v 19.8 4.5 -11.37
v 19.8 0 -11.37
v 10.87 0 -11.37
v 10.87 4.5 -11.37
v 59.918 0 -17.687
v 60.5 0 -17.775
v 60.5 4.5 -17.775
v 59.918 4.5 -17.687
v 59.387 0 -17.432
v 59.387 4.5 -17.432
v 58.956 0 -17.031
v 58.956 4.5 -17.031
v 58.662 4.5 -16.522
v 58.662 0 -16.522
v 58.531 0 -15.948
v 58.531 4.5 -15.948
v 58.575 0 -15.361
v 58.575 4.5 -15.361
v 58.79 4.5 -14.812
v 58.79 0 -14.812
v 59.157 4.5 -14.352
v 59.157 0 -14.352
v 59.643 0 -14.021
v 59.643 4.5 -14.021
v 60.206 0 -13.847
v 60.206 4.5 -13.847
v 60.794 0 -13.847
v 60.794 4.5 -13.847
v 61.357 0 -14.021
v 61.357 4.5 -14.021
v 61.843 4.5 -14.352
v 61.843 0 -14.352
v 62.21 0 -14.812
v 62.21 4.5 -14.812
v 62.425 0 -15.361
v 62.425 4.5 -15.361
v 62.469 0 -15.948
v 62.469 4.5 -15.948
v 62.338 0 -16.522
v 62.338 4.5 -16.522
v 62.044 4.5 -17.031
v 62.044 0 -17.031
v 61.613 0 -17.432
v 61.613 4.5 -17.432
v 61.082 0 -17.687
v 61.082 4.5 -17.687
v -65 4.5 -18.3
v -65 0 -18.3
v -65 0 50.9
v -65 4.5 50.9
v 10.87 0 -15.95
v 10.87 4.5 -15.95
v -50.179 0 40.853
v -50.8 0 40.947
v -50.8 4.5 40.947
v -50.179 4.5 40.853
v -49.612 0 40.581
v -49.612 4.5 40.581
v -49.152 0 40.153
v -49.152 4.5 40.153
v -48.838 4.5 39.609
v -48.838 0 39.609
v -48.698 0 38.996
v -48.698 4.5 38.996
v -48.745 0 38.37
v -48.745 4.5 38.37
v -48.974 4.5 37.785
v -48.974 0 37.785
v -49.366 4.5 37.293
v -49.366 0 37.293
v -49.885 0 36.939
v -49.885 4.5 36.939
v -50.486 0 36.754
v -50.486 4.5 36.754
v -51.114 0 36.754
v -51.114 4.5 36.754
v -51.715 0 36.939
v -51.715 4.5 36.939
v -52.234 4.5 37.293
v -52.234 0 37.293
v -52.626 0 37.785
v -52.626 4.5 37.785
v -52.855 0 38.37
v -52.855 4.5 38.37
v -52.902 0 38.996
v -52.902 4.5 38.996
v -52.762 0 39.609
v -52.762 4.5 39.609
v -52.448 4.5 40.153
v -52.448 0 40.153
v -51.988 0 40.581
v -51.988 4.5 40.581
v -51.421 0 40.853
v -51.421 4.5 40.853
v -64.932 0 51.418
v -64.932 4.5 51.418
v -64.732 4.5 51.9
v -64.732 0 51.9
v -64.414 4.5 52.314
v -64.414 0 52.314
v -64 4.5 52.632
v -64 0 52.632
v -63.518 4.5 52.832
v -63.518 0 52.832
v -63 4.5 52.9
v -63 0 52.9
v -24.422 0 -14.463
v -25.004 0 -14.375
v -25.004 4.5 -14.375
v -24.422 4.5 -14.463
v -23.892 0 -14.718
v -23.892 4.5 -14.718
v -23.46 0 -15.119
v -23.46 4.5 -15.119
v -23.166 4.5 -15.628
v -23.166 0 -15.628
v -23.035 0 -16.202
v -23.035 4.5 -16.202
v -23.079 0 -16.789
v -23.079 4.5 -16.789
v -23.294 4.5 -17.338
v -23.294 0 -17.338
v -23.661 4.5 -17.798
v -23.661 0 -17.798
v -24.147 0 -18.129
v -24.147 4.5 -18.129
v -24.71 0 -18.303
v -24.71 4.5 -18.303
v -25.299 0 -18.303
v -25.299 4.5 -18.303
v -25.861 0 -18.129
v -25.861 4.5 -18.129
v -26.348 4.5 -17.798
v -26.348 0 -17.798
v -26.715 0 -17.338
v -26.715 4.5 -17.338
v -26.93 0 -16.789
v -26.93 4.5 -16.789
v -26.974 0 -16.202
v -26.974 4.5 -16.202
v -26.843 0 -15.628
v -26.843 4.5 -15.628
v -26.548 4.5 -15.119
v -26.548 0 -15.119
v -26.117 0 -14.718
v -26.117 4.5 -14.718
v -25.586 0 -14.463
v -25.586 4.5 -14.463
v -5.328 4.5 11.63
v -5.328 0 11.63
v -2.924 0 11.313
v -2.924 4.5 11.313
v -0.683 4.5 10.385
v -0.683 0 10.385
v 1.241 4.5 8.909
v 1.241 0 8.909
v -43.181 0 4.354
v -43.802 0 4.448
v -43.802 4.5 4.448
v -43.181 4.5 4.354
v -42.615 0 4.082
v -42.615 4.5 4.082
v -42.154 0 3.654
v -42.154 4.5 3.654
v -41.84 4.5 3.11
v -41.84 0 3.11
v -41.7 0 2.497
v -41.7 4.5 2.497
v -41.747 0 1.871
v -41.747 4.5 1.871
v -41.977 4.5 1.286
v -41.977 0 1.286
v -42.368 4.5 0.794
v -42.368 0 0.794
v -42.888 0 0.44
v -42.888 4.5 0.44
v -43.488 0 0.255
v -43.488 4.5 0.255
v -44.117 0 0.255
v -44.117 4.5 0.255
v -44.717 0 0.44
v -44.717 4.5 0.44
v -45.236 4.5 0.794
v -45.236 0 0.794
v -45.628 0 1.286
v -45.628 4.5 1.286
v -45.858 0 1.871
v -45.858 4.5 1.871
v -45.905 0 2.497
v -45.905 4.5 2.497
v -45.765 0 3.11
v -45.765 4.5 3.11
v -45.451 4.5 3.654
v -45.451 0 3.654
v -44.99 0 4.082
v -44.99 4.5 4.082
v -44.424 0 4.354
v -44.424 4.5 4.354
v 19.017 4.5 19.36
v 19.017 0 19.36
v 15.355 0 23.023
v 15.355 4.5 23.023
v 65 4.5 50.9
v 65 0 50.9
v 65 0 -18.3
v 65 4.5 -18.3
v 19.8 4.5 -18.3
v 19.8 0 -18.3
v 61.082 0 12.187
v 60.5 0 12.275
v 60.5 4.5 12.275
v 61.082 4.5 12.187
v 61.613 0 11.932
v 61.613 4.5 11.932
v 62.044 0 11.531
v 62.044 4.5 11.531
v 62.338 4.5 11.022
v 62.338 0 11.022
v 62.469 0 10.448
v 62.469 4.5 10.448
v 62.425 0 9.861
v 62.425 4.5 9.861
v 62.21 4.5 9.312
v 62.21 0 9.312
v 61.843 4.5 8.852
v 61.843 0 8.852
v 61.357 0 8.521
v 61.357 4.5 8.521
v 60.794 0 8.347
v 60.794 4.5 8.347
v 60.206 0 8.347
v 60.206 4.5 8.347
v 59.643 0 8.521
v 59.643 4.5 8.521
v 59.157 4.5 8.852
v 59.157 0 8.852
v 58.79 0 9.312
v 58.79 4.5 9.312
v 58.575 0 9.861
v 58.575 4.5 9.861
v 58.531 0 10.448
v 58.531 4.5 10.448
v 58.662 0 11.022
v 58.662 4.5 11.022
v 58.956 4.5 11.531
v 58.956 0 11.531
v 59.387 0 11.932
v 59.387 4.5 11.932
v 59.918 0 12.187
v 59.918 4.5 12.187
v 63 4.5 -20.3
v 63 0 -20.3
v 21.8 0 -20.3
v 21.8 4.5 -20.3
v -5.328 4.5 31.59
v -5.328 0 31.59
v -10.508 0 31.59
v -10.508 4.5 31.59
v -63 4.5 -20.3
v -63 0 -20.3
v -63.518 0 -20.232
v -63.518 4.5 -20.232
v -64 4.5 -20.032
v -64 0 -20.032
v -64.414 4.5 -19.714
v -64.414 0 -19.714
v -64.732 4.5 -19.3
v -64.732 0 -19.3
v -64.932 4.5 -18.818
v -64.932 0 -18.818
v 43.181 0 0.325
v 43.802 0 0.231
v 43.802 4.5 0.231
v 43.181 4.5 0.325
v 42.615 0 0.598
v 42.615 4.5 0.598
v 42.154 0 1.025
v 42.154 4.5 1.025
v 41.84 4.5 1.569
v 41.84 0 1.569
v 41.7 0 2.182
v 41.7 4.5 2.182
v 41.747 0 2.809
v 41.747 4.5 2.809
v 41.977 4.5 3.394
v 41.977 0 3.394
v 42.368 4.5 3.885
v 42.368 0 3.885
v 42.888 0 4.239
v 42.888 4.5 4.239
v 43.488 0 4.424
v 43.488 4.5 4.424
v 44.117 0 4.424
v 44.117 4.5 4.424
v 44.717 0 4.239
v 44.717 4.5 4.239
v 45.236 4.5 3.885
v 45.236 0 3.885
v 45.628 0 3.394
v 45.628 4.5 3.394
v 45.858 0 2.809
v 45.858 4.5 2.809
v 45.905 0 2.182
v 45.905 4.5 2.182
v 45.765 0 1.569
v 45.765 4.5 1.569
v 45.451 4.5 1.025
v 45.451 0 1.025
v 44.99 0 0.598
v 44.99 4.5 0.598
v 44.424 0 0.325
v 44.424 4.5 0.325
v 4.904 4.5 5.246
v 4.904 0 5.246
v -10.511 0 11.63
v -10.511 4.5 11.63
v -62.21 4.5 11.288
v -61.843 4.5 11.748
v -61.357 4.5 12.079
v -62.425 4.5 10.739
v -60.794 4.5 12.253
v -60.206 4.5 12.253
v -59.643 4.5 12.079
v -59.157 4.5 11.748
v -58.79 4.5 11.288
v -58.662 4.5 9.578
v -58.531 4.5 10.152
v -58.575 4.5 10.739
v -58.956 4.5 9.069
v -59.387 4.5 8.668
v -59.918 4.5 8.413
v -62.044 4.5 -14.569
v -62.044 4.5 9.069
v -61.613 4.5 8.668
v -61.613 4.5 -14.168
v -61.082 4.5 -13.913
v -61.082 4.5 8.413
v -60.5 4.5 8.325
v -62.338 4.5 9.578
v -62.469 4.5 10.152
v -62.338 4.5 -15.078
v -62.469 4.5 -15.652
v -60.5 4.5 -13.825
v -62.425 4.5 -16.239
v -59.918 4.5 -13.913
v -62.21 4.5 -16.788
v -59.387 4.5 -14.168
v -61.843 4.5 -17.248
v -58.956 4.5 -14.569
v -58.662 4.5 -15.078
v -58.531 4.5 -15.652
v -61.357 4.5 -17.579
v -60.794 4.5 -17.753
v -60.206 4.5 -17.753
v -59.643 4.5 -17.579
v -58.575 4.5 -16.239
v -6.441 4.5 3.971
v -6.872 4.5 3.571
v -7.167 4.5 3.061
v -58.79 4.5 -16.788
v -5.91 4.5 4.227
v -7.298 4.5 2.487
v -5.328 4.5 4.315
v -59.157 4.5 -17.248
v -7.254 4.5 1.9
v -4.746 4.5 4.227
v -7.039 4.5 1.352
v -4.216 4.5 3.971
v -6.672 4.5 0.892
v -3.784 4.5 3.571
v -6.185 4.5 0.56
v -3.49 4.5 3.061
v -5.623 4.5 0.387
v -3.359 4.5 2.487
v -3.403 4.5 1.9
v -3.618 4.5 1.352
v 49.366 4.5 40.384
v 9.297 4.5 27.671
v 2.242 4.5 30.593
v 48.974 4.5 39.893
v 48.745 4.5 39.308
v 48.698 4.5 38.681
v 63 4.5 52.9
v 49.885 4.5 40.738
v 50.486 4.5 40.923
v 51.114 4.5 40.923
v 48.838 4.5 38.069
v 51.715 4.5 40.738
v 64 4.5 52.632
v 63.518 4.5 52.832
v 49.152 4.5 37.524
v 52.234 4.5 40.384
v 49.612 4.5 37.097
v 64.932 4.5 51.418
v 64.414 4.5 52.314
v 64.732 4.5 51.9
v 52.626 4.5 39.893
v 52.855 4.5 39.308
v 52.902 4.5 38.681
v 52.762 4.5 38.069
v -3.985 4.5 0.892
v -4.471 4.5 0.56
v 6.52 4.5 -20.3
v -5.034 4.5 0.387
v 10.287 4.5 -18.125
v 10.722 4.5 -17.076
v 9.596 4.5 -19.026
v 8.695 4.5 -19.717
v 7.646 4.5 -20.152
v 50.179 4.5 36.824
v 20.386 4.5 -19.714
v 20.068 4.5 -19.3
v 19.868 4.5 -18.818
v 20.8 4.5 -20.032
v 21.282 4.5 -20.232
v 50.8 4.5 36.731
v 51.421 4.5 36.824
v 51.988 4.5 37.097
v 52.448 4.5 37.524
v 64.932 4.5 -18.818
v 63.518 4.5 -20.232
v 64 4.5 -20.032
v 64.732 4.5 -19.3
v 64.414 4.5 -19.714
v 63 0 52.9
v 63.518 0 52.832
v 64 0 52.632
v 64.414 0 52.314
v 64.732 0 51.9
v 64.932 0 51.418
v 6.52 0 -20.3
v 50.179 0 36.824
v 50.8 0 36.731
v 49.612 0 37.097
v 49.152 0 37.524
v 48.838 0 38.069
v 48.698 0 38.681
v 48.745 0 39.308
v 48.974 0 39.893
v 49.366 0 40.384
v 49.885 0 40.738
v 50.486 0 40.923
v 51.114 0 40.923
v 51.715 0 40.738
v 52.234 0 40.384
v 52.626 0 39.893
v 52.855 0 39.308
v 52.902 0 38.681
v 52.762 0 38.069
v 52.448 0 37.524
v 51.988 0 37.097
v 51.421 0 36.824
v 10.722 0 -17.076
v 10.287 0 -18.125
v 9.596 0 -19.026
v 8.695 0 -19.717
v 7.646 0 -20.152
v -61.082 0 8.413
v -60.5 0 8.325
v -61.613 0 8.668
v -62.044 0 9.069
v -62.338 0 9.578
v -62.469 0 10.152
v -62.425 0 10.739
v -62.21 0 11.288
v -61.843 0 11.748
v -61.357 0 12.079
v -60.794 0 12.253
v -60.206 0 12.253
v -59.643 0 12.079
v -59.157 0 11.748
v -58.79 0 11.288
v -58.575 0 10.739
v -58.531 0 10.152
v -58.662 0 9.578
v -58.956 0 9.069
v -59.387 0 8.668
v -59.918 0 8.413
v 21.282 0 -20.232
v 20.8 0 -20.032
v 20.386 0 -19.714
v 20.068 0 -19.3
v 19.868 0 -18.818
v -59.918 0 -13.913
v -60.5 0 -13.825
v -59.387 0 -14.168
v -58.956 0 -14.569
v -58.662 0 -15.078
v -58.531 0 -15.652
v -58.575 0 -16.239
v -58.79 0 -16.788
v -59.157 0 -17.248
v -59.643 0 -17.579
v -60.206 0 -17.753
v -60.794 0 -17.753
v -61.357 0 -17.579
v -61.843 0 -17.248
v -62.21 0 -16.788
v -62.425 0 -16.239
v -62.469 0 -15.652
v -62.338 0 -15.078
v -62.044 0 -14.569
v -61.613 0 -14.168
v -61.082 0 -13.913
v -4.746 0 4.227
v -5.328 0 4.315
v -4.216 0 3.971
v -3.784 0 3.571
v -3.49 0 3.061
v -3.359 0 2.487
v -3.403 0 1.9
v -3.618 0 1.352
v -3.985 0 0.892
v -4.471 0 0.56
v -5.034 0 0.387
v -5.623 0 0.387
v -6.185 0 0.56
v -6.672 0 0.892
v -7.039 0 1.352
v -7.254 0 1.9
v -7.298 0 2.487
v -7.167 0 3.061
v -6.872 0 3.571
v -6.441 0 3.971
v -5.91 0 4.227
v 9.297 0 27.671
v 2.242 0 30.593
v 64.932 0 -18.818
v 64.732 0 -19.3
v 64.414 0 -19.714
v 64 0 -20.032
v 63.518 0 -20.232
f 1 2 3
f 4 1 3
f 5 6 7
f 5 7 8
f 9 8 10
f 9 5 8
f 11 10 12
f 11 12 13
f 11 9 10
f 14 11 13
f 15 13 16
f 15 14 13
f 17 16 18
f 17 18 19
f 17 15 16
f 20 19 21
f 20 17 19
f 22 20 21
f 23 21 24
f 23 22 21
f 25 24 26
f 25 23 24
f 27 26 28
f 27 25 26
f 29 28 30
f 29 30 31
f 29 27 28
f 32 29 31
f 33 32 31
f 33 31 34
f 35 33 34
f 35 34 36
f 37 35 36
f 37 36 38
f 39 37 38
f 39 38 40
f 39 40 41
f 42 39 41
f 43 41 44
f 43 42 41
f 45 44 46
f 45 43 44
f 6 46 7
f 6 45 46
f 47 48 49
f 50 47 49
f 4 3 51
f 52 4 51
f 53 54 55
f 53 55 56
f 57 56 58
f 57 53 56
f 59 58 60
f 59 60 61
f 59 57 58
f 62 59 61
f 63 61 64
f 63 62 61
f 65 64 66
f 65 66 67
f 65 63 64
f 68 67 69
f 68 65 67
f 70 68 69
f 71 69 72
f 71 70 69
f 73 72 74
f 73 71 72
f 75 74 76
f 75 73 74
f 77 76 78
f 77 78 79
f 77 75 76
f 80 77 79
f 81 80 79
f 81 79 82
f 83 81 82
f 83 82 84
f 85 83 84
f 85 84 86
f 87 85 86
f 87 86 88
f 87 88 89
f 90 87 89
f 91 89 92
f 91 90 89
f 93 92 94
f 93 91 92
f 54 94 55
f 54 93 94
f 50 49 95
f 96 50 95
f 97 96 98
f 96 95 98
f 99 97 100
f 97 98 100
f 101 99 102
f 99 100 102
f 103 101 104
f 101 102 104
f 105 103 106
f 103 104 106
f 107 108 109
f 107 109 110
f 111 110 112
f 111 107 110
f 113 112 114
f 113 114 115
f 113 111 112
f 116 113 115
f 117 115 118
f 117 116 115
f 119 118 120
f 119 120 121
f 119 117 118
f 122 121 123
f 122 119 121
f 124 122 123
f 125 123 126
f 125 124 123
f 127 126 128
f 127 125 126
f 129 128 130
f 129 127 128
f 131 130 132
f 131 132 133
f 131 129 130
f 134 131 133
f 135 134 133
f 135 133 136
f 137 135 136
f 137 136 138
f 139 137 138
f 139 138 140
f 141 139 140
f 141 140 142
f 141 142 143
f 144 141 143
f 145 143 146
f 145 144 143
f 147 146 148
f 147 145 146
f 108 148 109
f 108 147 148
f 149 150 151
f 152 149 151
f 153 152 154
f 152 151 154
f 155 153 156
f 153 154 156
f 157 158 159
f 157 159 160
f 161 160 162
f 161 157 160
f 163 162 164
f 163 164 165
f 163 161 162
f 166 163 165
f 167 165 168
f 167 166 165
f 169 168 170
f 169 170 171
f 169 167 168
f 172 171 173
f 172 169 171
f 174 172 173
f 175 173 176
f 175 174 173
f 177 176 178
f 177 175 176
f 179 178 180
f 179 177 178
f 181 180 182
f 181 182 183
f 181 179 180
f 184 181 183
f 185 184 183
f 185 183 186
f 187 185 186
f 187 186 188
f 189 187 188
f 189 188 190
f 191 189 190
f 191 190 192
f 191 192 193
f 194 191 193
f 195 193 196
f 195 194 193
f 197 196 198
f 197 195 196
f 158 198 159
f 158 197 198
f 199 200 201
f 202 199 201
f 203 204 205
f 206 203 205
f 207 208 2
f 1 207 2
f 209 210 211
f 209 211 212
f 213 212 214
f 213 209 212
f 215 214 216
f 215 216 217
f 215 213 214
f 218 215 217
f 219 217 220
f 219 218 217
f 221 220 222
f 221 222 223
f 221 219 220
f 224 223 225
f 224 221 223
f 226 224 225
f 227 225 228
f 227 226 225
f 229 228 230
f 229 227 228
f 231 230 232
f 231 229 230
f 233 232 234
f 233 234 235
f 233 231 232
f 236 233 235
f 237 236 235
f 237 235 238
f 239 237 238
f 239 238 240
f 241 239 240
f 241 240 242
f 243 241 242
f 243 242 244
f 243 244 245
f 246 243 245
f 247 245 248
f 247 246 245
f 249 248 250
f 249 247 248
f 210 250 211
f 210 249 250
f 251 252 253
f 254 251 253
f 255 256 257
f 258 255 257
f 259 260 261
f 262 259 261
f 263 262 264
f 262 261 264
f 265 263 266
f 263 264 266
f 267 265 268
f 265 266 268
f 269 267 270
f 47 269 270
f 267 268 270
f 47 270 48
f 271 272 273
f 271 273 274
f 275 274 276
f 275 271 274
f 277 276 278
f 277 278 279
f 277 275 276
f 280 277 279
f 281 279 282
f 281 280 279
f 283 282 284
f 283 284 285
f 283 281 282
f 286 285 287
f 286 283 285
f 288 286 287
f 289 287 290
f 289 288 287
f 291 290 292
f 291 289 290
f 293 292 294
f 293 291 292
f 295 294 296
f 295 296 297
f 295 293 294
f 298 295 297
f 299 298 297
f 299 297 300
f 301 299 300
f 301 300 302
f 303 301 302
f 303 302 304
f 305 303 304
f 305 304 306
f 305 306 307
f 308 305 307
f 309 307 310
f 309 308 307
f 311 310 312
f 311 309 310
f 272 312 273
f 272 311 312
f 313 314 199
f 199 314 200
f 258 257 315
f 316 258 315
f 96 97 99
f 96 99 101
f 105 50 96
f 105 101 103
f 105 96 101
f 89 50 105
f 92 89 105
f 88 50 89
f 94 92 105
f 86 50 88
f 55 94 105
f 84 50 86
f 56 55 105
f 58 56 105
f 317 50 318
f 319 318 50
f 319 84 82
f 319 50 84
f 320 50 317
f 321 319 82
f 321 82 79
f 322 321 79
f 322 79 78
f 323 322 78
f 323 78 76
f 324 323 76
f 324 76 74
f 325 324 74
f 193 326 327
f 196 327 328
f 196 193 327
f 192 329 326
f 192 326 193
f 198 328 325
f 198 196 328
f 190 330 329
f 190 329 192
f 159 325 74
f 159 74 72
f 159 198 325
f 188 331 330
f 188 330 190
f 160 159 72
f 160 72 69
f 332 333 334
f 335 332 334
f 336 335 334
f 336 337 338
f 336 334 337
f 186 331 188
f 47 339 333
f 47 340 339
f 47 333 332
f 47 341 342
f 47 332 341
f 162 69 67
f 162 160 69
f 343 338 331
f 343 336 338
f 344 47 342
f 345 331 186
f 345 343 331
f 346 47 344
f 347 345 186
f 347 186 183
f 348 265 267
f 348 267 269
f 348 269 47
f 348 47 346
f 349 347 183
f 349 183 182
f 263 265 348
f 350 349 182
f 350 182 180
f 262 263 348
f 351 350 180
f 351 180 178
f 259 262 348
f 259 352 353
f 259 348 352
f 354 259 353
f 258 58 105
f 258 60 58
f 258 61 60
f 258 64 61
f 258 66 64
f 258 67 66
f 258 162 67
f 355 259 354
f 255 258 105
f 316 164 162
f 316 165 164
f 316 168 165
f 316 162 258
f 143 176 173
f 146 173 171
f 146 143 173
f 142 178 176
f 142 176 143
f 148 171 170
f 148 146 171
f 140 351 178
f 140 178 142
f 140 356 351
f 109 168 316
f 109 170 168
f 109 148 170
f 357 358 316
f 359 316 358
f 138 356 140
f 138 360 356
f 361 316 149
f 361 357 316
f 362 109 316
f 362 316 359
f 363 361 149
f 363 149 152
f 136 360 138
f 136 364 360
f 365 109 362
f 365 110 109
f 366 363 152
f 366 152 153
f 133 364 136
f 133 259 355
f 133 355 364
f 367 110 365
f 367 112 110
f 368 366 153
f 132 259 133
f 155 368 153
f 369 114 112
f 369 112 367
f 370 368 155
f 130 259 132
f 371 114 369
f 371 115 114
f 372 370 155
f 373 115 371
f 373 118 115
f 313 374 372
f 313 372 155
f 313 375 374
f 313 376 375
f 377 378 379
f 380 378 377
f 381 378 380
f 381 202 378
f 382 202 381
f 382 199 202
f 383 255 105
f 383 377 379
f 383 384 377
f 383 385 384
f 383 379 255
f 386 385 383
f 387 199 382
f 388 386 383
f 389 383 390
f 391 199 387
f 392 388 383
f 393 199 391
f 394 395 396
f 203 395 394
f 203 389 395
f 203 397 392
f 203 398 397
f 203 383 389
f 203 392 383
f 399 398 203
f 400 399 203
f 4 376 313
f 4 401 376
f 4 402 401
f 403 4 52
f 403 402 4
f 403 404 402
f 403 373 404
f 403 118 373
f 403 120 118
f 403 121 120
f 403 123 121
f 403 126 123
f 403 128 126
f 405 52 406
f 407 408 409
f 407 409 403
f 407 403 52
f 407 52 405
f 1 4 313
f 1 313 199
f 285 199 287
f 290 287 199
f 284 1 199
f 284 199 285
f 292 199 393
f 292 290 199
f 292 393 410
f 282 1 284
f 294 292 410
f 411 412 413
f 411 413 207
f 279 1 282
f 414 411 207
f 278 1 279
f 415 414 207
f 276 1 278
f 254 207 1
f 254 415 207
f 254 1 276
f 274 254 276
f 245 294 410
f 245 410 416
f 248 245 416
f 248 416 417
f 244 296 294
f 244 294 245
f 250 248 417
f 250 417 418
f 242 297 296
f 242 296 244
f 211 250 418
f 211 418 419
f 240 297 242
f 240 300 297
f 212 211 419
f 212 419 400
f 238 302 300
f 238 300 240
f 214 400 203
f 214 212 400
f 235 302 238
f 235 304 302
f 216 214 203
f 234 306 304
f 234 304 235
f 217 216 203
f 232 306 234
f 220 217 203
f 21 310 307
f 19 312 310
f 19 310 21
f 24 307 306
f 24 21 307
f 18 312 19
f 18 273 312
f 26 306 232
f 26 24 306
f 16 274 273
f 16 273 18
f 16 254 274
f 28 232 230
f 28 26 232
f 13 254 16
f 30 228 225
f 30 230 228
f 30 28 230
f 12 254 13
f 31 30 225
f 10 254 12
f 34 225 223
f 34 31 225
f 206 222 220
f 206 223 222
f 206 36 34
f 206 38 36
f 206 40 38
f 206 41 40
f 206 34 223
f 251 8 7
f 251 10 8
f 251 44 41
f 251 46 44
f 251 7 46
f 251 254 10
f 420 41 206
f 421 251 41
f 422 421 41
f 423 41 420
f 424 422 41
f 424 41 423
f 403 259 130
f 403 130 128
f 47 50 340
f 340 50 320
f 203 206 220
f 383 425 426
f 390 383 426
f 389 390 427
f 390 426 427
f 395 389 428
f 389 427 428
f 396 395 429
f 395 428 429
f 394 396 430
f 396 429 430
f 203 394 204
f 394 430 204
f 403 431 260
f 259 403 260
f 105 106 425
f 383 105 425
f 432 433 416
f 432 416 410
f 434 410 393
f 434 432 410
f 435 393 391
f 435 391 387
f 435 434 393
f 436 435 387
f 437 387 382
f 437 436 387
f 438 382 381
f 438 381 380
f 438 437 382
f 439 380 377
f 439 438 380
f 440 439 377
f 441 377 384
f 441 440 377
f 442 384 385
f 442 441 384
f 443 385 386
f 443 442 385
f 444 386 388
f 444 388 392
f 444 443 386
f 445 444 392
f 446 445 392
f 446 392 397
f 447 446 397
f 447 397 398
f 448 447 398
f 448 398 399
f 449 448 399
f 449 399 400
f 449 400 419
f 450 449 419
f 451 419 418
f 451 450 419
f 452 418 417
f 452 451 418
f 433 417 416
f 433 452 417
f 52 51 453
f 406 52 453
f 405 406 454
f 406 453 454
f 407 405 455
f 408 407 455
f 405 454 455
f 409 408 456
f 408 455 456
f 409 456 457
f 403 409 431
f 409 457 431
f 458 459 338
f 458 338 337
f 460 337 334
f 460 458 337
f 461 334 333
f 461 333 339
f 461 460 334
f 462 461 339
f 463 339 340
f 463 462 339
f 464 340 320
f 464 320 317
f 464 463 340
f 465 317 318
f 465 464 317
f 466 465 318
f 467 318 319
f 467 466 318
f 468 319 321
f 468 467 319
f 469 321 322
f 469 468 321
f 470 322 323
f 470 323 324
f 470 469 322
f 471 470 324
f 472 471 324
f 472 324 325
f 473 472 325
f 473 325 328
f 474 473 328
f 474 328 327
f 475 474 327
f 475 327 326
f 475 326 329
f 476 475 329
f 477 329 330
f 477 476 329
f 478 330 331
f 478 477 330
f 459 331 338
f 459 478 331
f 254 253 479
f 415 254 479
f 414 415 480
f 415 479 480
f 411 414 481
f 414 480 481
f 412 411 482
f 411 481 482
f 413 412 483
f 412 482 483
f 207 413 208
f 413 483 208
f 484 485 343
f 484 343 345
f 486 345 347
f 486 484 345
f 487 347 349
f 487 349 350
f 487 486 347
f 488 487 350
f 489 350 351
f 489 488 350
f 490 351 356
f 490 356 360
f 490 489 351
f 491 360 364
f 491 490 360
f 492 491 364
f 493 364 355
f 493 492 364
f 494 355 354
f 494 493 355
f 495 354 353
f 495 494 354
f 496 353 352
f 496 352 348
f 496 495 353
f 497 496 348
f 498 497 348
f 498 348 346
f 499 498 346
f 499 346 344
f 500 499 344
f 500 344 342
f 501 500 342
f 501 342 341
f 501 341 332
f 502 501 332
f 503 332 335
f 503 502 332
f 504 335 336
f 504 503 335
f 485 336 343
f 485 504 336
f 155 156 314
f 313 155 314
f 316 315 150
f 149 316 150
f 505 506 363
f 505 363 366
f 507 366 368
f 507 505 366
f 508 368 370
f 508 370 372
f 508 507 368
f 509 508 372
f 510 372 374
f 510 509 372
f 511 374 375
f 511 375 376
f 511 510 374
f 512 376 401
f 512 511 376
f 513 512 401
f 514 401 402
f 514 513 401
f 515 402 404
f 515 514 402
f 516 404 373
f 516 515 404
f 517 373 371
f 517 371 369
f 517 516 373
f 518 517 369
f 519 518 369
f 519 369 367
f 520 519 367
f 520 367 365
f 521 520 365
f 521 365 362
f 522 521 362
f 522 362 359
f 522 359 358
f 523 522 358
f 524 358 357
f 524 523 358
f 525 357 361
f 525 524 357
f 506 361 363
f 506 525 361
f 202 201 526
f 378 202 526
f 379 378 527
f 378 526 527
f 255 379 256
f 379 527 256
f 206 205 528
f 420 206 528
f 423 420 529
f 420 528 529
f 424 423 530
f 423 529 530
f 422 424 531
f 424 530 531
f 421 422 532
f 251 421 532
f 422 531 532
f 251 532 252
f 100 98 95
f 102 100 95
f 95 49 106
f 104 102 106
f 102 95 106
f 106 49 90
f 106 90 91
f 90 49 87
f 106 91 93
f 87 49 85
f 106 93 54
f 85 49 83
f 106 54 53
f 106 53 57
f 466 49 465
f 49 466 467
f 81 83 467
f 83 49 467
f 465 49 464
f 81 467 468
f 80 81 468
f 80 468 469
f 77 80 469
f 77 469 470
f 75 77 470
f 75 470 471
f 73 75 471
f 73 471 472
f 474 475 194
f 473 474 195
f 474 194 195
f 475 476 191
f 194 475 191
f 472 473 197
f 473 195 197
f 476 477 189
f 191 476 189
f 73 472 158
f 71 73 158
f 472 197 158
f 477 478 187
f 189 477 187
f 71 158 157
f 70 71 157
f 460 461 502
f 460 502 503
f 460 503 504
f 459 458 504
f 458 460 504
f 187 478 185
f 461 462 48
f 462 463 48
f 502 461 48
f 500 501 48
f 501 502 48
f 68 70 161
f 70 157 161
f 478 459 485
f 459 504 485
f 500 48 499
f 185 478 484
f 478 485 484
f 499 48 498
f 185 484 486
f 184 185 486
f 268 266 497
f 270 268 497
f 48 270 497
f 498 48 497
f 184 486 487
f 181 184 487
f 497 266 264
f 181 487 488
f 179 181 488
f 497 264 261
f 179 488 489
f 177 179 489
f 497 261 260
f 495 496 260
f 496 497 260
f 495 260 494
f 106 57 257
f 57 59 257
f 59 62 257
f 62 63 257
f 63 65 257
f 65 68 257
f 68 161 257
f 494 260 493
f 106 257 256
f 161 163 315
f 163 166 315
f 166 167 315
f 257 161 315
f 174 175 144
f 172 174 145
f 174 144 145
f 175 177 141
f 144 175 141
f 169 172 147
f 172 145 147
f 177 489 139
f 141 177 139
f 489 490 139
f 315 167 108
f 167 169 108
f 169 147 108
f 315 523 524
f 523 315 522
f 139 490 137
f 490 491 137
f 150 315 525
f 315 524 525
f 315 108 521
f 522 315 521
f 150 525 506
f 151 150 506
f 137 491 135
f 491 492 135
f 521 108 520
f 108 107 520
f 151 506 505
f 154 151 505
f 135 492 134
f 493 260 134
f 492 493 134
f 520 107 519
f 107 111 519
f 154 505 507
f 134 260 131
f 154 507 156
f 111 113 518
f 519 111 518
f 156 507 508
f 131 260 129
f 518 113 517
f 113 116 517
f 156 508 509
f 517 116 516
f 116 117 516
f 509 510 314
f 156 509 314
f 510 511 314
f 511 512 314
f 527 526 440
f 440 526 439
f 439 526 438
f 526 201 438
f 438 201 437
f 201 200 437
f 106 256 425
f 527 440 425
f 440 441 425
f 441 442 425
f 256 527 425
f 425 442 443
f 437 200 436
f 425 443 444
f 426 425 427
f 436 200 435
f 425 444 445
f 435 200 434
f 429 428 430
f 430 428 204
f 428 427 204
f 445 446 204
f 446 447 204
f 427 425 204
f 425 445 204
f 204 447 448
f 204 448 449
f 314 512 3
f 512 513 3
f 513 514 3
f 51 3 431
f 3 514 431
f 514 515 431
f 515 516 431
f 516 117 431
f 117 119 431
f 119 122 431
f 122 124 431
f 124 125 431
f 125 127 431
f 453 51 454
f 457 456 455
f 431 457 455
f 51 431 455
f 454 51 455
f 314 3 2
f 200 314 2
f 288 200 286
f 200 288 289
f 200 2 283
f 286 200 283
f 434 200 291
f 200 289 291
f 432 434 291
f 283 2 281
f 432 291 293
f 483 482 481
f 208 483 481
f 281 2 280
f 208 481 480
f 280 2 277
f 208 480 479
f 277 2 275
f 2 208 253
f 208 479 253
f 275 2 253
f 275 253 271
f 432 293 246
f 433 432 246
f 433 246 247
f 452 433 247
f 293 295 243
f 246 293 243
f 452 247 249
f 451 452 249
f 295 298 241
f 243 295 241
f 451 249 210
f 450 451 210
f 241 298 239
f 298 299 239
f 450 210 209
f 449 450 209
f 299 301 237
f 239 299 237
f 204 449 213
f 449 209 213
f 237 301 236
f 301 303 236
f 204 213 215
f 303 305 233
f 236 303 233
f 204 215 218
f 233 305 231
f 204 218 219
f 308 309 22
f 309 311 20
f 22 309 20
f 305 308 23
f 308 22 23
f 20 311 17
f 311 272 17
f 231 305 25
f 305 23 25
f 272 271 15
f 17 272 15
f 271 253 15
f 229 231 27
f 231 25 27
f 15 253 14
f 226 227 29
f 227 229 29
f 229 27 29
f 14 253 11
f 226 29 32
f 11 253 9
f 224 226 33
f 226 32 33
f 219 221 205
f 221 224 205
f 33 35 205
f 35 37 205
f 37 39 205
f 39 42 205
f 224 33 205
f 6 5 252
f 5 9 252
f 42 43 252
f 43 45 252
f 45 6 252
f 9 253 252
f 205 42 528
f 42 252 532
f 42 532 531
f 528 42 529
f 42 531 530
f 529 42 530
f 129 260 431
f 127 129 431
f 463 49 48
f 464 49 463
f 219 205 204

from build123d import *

# Parameters (mm, degrees)
SKETCH1_R           = 1.975
SKETCH1_R_2         = 2.1082
BOSS_EXTRUDE1_DEPTH = 4.5


with BuildPart() as part:
    # Sketch1 → Boss-Extrude1 (new body)
    with BuildSketch(Plane(origin=(0, 0, 0), x_dir=(1, 0, 0), z_dir=(0, 1, 0))):
        with BuildLine():
            Line((63, 20.3), (21.8, 20.3))
            ThreePointArc((21.8, 20.3), (20.385786438, 19.714213562), (19.8, 18.3))
            Line((19.8, 18.3), (19.8, 11.37))
            Line((19.8, 11.37), (10.87, 11.37))
            Line((10.87, 11.37), (10.87, 15.95))
            ThreePointArc((10.87, 15.95), (9.595914498, 19.025914498), (6.52, 20.3))
            Line((6.52, 20.3), (-63, 20.3))
            ThreePointArc((-63, 20.3), (-64.414213562, 19.714213562), (-65, 18.3))
            Line((-65, 18.3), (-65, -50.9))
            ThreePointArc((-65, -50.9), (-64.414213562, -52.314213562), (-63, -52.9))
            Line((-63, -52.9), (63, -52.9))
            ThreePointArc((63, -52.9), (64.414213562, -52.314213562), (65, -50.9))
            Line((65, -50.9), (65, 18.3))
            ThreePointArc((65, 18.3), (64.414213562, 19.714213562), (63, 20.3))
        make_face()
        with Locations(Location((-60.5, 15.8, 0), (0, 0, 270))):
            Circle(SKETCH1_R, mode=Mode.SUBTRACT)
        with Locations(Location((60.5, 15.8, 0), (0, 0, 90))):
            Circle(SKETCH1_R, mode=Mode.SUBTRACT)
        with Locations(Location((60.5, -10.3, 0), (0, 0, 270))):
            Circle(SKETCH1_R, mode=Mode.SUBTRACT)
        with Locations(Location((-60.5, -10.3, 0), (0, 0, 90))):
            Circle(SKETCH1_R, mode=Mode.SUBTRACT)
        with Locations(Location((-25.004260819, 16.35, 0), (0, 0, 270))):
            Circle(SKETCH1_R, mode=Mode.SUBTRACT)
        with Locations(Location((-5.328324842, -2.339651524, 0), (0, 0, 270))):
            Circle(SKETCH1_R, mode=Mode.SUBTRACT)
        with Locations(Location((-50.8, -38.838722529, 0), (0, 0, 270))):
            Circle(SKETCH1_R_2, mode=Mode.SUBTRACT)
        with Locations(Location((50.8, -38.838722529, 0), (0, 0, 90))):
            Circle(SKETCH1_R_2, mode=Mode.SUBTRACT)
        with Locations(Location((-43.8023, -2.339651524, 0), (0, 0, 270))):
            Circle(SKETCH1_R_2, mode=Mode.SUBTRACT)
        with Locations(Location((43.8023, -2.339651524, 0), (0, 0, 90))):
            Circle(SKETCH1_R_2, mode=Mode.SUBTRACT)
        with BuildLine():
            Line((-5.328324842, -31.589651524), (-10.508324842, -31.589651524))
            Line((-10.508324842, -31.589651524), (-10.5114167, -11.629651524))
            Line((-10.5114167, -11.629651524), (-5.328324842, -11.629651524))
            ThreePointArc((-5.328324842, -11.629651524), (-1.773195755, -10.922492381), (1.240697155, -8.908673522))
            Line((1.240697155, -8.908673522), (4.903510282, -5.245860395))
            Line((4.903510282, -5.245860395), (19.017361634, -19.359711748))
            Line((19.017361634, -19.359711748), (15.354548508, -23.022524874))
            ThreePointArc((15.354548508, -23.022524874), (5.865165555, -29.36312785), (-5.328324842, -31.589651524))
        make_face(mode=Mode.SUBTRACT)
    extrude(amount=BOSS_EXTRUDE1_DEPTH)


solid = part.part
